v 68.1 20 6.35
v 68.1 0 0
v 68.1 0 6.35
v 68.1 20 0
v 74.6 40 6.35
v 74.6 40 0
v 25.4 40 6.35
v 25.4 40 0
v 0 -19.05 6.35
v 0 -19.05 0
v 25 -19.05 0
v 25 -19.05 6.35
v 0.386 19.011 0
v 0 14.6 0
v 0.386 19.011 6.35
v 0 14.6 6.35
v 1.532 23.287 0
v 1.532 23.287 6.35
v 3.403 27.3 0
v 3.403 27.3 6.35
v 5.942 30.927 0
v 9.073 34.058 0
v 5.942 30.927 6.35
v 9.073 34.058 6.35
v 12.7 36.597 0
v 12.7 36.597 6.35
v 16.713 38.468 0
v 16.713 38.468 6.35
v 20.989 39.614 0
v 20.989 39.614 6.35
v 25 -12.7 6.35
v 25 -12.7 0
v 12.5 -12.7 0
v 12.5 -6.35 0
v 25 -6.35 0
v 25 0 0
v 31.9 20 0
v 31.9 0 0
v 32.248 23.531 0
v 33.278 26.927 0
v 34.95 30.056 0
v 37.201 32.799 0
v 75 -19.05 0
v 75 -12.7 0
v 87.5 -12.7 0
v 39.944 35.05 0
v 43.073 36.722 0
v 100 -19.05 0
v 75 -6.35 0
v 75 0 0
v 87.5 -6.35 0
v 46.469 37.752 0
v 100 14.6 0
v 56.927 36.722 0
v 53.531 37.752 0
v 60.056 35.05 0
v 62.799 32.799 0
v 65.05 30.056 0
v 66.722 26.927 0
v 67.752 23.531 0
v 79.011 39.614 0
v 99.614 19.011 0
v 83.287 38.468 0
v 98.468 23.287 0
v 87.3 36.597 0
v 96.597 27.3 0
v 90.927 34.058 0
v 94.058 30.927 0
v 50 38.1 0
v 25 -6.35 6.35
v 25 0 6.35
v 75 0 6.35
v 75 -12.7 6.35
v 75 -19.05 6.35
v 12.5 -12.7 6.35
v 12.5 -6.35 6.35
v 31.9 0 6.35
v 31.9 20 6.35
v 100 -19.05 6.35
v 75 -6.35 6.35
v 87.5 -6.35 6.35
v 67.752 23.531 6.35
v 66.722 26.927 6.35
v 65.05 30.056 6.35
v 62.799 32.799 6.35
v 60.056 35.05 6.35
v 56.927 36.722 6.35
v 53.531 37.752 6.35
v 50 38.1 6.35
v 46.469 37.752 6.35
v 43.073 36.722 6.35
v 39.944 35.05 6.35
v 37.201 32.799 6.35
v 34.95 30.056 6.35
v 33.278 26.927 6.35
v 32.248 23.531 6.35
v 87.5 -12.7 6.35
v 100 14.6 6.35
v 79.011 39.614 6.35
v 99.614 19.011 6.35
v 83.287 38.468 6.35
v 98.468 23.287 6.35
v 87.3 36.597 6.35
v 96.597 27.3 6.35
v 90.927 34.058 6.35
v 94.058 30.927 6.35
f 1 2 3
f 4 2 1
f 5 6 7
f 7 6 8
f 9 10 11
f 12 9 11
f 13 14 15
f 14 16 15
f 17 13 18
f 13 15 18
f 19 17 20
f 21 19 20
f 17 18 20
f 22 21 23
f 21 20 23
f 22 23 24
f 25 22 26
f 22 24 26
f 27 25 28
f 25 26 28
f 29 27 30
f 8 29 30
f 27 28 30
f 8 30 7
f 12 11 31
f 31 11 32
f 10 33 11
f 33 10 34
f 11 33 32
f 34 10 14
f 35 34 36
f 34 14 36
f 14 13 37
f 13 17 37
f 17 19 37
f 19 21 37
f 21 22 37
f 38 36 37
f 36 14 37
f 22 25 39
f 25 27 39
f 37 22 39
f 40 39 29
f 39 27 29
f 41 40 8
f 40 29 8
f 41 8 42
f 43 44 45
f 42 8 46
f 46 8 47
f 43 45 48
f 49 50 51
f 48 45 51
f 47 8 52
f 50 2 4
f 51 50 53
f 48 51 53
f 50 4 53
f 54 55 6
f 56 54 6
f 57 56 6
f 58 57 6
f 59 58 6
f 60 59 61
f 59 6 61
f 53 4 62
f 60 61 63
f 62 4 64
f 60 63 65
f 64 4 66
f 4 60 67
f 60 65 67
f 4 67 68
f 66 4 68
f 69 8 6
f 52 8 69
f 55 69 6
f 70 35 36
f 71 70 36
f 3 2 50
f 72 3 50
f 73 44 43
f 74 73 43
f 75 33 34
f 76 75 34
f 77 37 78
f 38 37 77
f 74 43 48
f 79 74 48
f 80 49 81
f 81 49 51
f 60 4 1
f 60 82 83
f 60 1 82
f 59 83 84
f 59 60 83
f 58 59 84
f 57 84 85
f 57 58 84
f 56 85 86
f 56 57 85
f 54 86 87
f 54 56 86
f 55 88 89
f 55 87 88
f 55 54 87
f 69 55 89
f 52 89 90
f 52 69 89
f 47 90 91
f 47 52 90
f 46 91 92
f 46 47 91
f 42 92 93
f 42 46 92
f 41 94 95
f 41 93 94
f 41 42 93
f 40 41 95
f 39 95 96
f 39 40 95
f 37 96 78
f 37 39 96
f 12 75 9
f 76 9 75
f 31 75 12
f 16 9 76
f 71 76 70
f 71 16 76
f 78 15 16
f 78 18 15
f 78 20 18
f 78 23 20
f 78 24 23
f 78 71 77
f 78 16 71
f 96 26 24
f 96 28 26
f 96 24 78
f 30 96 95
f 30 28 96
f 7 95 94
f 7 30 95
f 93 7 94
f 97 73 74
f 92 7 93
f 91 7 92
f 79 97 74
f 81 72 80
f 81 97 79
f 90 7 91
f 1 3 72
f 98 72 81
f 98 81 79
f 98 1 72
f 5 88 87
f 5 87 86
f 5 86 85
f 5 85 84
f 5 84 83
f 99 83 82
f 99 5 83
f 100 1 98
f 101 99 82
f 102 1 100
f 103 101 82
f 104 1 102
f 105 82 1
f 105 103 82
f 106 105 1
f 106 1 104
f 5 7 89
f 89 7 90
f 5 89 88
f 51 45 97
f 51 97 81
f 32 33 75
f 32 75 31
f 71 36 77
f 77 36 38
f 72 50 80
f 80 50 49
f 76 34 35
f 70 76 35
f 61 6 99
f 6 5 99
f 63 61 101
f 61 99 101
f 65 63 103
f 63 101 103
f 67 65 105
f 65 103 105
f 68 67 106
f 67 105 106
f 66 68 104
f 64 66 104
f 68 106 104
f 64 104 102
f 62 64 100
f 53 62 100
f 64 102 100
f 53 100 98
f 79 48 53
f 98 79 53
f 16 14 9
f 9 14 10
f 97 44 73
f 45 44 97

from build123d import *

# Parameters (mm, degrees)
BOSS_EXTRUDE1_DEPTH     = 6.35
CUT_EXTRUDE1_DEPTH      = 108.890326167
CUT_EXTRUDE1_DEPTH_BACK = 108.890326167
FILLET1_R               = 25.4
CUT_EXTRUDE2_DEPTH      = 108.890326167
CUT_EXTRUDE2_DEPTH_BACK = 108.890326167
SKETCH4_W               = 12.499999987
SKETCH4_H               = 6.35


with BuildPart() as part:
    # Sketch1 → Boss-Extrude1 (new body)
    with BuildSketch(Plane.XY):
        Polygon((24.999999974, 0), (74.999999923, 0), (74.999999923, -6.35), (74.999999923, -19.05), (99.999999898, -19.05), (99.999999898, -6.35), (99.999999898, 0), (99.999999898, 40.00000001), (0, 40.00000001), (0, 0), (0, -6.35), (0, -19.05), (24.999999974, -19.05), (24.999999974, -6.35), align=None)
    extrude(amount=BOSS_EXTRUDE1_DEPTH)

    # Sketch2 → Cut-Extrude1 (cut, two sides: drawn at the far end of the back side and taken through both)
    with BuildSketch(Plane.XY.offset(6.35).offset(-CUT_EXTRUDE1_DEPTH_BACK)):
        with BuildLine():
            ThreePointArc((68.099999944, 20.000000005), (49.999999949, 38.1), (31.899999954, 20.000000005))
            Line((31.899999954, 20.000000005), (31.899999954, 0))
            Line((31.899999954, 0), (68.099999944, 0))
            Line((68.099999944, 0), (68.099999944, 20.000000005))
        make_face()
    extrude(amount=CUT_EXTRUDE1_DEPTH + CUT_EXTRUDE1_DEPTH_BACK, mode=Mode.SUBTRACT)

    # Fillet1
    fillet1_edges = [part.edges().sort_by_distance(p)[0] for p in [
        (0, 40.00000001, 3.175),
        (99.999999898, 40.00000001, 3.175),
    ]]
    fillet(fillet1_edges, radius=FILLET1_R)

    # Sketch4 → Cut-Extrude2 (cut, two sides: drawn at the far end of the back side and taken through both)
    with BuildSketch(Plane.XY.offset(6.35).offset(-CUT_EXTRUDE2_DEPTH_BACK)):
        with Locations((18.749999981, -9.525)):
            Rectangle(SKETCH4_W, SKETCH4_H)
        with Locations((81.249999918, -9.525)):
            Rectangle(SKETCH4_W, SKETCH4_H)
    extrude(amount=CUT_EXTRUDE2_DEPTH + CUT_EXTRUDE2_DEPTH_BACK, mode=Mode.SUBTRACT)


solid = part.part
